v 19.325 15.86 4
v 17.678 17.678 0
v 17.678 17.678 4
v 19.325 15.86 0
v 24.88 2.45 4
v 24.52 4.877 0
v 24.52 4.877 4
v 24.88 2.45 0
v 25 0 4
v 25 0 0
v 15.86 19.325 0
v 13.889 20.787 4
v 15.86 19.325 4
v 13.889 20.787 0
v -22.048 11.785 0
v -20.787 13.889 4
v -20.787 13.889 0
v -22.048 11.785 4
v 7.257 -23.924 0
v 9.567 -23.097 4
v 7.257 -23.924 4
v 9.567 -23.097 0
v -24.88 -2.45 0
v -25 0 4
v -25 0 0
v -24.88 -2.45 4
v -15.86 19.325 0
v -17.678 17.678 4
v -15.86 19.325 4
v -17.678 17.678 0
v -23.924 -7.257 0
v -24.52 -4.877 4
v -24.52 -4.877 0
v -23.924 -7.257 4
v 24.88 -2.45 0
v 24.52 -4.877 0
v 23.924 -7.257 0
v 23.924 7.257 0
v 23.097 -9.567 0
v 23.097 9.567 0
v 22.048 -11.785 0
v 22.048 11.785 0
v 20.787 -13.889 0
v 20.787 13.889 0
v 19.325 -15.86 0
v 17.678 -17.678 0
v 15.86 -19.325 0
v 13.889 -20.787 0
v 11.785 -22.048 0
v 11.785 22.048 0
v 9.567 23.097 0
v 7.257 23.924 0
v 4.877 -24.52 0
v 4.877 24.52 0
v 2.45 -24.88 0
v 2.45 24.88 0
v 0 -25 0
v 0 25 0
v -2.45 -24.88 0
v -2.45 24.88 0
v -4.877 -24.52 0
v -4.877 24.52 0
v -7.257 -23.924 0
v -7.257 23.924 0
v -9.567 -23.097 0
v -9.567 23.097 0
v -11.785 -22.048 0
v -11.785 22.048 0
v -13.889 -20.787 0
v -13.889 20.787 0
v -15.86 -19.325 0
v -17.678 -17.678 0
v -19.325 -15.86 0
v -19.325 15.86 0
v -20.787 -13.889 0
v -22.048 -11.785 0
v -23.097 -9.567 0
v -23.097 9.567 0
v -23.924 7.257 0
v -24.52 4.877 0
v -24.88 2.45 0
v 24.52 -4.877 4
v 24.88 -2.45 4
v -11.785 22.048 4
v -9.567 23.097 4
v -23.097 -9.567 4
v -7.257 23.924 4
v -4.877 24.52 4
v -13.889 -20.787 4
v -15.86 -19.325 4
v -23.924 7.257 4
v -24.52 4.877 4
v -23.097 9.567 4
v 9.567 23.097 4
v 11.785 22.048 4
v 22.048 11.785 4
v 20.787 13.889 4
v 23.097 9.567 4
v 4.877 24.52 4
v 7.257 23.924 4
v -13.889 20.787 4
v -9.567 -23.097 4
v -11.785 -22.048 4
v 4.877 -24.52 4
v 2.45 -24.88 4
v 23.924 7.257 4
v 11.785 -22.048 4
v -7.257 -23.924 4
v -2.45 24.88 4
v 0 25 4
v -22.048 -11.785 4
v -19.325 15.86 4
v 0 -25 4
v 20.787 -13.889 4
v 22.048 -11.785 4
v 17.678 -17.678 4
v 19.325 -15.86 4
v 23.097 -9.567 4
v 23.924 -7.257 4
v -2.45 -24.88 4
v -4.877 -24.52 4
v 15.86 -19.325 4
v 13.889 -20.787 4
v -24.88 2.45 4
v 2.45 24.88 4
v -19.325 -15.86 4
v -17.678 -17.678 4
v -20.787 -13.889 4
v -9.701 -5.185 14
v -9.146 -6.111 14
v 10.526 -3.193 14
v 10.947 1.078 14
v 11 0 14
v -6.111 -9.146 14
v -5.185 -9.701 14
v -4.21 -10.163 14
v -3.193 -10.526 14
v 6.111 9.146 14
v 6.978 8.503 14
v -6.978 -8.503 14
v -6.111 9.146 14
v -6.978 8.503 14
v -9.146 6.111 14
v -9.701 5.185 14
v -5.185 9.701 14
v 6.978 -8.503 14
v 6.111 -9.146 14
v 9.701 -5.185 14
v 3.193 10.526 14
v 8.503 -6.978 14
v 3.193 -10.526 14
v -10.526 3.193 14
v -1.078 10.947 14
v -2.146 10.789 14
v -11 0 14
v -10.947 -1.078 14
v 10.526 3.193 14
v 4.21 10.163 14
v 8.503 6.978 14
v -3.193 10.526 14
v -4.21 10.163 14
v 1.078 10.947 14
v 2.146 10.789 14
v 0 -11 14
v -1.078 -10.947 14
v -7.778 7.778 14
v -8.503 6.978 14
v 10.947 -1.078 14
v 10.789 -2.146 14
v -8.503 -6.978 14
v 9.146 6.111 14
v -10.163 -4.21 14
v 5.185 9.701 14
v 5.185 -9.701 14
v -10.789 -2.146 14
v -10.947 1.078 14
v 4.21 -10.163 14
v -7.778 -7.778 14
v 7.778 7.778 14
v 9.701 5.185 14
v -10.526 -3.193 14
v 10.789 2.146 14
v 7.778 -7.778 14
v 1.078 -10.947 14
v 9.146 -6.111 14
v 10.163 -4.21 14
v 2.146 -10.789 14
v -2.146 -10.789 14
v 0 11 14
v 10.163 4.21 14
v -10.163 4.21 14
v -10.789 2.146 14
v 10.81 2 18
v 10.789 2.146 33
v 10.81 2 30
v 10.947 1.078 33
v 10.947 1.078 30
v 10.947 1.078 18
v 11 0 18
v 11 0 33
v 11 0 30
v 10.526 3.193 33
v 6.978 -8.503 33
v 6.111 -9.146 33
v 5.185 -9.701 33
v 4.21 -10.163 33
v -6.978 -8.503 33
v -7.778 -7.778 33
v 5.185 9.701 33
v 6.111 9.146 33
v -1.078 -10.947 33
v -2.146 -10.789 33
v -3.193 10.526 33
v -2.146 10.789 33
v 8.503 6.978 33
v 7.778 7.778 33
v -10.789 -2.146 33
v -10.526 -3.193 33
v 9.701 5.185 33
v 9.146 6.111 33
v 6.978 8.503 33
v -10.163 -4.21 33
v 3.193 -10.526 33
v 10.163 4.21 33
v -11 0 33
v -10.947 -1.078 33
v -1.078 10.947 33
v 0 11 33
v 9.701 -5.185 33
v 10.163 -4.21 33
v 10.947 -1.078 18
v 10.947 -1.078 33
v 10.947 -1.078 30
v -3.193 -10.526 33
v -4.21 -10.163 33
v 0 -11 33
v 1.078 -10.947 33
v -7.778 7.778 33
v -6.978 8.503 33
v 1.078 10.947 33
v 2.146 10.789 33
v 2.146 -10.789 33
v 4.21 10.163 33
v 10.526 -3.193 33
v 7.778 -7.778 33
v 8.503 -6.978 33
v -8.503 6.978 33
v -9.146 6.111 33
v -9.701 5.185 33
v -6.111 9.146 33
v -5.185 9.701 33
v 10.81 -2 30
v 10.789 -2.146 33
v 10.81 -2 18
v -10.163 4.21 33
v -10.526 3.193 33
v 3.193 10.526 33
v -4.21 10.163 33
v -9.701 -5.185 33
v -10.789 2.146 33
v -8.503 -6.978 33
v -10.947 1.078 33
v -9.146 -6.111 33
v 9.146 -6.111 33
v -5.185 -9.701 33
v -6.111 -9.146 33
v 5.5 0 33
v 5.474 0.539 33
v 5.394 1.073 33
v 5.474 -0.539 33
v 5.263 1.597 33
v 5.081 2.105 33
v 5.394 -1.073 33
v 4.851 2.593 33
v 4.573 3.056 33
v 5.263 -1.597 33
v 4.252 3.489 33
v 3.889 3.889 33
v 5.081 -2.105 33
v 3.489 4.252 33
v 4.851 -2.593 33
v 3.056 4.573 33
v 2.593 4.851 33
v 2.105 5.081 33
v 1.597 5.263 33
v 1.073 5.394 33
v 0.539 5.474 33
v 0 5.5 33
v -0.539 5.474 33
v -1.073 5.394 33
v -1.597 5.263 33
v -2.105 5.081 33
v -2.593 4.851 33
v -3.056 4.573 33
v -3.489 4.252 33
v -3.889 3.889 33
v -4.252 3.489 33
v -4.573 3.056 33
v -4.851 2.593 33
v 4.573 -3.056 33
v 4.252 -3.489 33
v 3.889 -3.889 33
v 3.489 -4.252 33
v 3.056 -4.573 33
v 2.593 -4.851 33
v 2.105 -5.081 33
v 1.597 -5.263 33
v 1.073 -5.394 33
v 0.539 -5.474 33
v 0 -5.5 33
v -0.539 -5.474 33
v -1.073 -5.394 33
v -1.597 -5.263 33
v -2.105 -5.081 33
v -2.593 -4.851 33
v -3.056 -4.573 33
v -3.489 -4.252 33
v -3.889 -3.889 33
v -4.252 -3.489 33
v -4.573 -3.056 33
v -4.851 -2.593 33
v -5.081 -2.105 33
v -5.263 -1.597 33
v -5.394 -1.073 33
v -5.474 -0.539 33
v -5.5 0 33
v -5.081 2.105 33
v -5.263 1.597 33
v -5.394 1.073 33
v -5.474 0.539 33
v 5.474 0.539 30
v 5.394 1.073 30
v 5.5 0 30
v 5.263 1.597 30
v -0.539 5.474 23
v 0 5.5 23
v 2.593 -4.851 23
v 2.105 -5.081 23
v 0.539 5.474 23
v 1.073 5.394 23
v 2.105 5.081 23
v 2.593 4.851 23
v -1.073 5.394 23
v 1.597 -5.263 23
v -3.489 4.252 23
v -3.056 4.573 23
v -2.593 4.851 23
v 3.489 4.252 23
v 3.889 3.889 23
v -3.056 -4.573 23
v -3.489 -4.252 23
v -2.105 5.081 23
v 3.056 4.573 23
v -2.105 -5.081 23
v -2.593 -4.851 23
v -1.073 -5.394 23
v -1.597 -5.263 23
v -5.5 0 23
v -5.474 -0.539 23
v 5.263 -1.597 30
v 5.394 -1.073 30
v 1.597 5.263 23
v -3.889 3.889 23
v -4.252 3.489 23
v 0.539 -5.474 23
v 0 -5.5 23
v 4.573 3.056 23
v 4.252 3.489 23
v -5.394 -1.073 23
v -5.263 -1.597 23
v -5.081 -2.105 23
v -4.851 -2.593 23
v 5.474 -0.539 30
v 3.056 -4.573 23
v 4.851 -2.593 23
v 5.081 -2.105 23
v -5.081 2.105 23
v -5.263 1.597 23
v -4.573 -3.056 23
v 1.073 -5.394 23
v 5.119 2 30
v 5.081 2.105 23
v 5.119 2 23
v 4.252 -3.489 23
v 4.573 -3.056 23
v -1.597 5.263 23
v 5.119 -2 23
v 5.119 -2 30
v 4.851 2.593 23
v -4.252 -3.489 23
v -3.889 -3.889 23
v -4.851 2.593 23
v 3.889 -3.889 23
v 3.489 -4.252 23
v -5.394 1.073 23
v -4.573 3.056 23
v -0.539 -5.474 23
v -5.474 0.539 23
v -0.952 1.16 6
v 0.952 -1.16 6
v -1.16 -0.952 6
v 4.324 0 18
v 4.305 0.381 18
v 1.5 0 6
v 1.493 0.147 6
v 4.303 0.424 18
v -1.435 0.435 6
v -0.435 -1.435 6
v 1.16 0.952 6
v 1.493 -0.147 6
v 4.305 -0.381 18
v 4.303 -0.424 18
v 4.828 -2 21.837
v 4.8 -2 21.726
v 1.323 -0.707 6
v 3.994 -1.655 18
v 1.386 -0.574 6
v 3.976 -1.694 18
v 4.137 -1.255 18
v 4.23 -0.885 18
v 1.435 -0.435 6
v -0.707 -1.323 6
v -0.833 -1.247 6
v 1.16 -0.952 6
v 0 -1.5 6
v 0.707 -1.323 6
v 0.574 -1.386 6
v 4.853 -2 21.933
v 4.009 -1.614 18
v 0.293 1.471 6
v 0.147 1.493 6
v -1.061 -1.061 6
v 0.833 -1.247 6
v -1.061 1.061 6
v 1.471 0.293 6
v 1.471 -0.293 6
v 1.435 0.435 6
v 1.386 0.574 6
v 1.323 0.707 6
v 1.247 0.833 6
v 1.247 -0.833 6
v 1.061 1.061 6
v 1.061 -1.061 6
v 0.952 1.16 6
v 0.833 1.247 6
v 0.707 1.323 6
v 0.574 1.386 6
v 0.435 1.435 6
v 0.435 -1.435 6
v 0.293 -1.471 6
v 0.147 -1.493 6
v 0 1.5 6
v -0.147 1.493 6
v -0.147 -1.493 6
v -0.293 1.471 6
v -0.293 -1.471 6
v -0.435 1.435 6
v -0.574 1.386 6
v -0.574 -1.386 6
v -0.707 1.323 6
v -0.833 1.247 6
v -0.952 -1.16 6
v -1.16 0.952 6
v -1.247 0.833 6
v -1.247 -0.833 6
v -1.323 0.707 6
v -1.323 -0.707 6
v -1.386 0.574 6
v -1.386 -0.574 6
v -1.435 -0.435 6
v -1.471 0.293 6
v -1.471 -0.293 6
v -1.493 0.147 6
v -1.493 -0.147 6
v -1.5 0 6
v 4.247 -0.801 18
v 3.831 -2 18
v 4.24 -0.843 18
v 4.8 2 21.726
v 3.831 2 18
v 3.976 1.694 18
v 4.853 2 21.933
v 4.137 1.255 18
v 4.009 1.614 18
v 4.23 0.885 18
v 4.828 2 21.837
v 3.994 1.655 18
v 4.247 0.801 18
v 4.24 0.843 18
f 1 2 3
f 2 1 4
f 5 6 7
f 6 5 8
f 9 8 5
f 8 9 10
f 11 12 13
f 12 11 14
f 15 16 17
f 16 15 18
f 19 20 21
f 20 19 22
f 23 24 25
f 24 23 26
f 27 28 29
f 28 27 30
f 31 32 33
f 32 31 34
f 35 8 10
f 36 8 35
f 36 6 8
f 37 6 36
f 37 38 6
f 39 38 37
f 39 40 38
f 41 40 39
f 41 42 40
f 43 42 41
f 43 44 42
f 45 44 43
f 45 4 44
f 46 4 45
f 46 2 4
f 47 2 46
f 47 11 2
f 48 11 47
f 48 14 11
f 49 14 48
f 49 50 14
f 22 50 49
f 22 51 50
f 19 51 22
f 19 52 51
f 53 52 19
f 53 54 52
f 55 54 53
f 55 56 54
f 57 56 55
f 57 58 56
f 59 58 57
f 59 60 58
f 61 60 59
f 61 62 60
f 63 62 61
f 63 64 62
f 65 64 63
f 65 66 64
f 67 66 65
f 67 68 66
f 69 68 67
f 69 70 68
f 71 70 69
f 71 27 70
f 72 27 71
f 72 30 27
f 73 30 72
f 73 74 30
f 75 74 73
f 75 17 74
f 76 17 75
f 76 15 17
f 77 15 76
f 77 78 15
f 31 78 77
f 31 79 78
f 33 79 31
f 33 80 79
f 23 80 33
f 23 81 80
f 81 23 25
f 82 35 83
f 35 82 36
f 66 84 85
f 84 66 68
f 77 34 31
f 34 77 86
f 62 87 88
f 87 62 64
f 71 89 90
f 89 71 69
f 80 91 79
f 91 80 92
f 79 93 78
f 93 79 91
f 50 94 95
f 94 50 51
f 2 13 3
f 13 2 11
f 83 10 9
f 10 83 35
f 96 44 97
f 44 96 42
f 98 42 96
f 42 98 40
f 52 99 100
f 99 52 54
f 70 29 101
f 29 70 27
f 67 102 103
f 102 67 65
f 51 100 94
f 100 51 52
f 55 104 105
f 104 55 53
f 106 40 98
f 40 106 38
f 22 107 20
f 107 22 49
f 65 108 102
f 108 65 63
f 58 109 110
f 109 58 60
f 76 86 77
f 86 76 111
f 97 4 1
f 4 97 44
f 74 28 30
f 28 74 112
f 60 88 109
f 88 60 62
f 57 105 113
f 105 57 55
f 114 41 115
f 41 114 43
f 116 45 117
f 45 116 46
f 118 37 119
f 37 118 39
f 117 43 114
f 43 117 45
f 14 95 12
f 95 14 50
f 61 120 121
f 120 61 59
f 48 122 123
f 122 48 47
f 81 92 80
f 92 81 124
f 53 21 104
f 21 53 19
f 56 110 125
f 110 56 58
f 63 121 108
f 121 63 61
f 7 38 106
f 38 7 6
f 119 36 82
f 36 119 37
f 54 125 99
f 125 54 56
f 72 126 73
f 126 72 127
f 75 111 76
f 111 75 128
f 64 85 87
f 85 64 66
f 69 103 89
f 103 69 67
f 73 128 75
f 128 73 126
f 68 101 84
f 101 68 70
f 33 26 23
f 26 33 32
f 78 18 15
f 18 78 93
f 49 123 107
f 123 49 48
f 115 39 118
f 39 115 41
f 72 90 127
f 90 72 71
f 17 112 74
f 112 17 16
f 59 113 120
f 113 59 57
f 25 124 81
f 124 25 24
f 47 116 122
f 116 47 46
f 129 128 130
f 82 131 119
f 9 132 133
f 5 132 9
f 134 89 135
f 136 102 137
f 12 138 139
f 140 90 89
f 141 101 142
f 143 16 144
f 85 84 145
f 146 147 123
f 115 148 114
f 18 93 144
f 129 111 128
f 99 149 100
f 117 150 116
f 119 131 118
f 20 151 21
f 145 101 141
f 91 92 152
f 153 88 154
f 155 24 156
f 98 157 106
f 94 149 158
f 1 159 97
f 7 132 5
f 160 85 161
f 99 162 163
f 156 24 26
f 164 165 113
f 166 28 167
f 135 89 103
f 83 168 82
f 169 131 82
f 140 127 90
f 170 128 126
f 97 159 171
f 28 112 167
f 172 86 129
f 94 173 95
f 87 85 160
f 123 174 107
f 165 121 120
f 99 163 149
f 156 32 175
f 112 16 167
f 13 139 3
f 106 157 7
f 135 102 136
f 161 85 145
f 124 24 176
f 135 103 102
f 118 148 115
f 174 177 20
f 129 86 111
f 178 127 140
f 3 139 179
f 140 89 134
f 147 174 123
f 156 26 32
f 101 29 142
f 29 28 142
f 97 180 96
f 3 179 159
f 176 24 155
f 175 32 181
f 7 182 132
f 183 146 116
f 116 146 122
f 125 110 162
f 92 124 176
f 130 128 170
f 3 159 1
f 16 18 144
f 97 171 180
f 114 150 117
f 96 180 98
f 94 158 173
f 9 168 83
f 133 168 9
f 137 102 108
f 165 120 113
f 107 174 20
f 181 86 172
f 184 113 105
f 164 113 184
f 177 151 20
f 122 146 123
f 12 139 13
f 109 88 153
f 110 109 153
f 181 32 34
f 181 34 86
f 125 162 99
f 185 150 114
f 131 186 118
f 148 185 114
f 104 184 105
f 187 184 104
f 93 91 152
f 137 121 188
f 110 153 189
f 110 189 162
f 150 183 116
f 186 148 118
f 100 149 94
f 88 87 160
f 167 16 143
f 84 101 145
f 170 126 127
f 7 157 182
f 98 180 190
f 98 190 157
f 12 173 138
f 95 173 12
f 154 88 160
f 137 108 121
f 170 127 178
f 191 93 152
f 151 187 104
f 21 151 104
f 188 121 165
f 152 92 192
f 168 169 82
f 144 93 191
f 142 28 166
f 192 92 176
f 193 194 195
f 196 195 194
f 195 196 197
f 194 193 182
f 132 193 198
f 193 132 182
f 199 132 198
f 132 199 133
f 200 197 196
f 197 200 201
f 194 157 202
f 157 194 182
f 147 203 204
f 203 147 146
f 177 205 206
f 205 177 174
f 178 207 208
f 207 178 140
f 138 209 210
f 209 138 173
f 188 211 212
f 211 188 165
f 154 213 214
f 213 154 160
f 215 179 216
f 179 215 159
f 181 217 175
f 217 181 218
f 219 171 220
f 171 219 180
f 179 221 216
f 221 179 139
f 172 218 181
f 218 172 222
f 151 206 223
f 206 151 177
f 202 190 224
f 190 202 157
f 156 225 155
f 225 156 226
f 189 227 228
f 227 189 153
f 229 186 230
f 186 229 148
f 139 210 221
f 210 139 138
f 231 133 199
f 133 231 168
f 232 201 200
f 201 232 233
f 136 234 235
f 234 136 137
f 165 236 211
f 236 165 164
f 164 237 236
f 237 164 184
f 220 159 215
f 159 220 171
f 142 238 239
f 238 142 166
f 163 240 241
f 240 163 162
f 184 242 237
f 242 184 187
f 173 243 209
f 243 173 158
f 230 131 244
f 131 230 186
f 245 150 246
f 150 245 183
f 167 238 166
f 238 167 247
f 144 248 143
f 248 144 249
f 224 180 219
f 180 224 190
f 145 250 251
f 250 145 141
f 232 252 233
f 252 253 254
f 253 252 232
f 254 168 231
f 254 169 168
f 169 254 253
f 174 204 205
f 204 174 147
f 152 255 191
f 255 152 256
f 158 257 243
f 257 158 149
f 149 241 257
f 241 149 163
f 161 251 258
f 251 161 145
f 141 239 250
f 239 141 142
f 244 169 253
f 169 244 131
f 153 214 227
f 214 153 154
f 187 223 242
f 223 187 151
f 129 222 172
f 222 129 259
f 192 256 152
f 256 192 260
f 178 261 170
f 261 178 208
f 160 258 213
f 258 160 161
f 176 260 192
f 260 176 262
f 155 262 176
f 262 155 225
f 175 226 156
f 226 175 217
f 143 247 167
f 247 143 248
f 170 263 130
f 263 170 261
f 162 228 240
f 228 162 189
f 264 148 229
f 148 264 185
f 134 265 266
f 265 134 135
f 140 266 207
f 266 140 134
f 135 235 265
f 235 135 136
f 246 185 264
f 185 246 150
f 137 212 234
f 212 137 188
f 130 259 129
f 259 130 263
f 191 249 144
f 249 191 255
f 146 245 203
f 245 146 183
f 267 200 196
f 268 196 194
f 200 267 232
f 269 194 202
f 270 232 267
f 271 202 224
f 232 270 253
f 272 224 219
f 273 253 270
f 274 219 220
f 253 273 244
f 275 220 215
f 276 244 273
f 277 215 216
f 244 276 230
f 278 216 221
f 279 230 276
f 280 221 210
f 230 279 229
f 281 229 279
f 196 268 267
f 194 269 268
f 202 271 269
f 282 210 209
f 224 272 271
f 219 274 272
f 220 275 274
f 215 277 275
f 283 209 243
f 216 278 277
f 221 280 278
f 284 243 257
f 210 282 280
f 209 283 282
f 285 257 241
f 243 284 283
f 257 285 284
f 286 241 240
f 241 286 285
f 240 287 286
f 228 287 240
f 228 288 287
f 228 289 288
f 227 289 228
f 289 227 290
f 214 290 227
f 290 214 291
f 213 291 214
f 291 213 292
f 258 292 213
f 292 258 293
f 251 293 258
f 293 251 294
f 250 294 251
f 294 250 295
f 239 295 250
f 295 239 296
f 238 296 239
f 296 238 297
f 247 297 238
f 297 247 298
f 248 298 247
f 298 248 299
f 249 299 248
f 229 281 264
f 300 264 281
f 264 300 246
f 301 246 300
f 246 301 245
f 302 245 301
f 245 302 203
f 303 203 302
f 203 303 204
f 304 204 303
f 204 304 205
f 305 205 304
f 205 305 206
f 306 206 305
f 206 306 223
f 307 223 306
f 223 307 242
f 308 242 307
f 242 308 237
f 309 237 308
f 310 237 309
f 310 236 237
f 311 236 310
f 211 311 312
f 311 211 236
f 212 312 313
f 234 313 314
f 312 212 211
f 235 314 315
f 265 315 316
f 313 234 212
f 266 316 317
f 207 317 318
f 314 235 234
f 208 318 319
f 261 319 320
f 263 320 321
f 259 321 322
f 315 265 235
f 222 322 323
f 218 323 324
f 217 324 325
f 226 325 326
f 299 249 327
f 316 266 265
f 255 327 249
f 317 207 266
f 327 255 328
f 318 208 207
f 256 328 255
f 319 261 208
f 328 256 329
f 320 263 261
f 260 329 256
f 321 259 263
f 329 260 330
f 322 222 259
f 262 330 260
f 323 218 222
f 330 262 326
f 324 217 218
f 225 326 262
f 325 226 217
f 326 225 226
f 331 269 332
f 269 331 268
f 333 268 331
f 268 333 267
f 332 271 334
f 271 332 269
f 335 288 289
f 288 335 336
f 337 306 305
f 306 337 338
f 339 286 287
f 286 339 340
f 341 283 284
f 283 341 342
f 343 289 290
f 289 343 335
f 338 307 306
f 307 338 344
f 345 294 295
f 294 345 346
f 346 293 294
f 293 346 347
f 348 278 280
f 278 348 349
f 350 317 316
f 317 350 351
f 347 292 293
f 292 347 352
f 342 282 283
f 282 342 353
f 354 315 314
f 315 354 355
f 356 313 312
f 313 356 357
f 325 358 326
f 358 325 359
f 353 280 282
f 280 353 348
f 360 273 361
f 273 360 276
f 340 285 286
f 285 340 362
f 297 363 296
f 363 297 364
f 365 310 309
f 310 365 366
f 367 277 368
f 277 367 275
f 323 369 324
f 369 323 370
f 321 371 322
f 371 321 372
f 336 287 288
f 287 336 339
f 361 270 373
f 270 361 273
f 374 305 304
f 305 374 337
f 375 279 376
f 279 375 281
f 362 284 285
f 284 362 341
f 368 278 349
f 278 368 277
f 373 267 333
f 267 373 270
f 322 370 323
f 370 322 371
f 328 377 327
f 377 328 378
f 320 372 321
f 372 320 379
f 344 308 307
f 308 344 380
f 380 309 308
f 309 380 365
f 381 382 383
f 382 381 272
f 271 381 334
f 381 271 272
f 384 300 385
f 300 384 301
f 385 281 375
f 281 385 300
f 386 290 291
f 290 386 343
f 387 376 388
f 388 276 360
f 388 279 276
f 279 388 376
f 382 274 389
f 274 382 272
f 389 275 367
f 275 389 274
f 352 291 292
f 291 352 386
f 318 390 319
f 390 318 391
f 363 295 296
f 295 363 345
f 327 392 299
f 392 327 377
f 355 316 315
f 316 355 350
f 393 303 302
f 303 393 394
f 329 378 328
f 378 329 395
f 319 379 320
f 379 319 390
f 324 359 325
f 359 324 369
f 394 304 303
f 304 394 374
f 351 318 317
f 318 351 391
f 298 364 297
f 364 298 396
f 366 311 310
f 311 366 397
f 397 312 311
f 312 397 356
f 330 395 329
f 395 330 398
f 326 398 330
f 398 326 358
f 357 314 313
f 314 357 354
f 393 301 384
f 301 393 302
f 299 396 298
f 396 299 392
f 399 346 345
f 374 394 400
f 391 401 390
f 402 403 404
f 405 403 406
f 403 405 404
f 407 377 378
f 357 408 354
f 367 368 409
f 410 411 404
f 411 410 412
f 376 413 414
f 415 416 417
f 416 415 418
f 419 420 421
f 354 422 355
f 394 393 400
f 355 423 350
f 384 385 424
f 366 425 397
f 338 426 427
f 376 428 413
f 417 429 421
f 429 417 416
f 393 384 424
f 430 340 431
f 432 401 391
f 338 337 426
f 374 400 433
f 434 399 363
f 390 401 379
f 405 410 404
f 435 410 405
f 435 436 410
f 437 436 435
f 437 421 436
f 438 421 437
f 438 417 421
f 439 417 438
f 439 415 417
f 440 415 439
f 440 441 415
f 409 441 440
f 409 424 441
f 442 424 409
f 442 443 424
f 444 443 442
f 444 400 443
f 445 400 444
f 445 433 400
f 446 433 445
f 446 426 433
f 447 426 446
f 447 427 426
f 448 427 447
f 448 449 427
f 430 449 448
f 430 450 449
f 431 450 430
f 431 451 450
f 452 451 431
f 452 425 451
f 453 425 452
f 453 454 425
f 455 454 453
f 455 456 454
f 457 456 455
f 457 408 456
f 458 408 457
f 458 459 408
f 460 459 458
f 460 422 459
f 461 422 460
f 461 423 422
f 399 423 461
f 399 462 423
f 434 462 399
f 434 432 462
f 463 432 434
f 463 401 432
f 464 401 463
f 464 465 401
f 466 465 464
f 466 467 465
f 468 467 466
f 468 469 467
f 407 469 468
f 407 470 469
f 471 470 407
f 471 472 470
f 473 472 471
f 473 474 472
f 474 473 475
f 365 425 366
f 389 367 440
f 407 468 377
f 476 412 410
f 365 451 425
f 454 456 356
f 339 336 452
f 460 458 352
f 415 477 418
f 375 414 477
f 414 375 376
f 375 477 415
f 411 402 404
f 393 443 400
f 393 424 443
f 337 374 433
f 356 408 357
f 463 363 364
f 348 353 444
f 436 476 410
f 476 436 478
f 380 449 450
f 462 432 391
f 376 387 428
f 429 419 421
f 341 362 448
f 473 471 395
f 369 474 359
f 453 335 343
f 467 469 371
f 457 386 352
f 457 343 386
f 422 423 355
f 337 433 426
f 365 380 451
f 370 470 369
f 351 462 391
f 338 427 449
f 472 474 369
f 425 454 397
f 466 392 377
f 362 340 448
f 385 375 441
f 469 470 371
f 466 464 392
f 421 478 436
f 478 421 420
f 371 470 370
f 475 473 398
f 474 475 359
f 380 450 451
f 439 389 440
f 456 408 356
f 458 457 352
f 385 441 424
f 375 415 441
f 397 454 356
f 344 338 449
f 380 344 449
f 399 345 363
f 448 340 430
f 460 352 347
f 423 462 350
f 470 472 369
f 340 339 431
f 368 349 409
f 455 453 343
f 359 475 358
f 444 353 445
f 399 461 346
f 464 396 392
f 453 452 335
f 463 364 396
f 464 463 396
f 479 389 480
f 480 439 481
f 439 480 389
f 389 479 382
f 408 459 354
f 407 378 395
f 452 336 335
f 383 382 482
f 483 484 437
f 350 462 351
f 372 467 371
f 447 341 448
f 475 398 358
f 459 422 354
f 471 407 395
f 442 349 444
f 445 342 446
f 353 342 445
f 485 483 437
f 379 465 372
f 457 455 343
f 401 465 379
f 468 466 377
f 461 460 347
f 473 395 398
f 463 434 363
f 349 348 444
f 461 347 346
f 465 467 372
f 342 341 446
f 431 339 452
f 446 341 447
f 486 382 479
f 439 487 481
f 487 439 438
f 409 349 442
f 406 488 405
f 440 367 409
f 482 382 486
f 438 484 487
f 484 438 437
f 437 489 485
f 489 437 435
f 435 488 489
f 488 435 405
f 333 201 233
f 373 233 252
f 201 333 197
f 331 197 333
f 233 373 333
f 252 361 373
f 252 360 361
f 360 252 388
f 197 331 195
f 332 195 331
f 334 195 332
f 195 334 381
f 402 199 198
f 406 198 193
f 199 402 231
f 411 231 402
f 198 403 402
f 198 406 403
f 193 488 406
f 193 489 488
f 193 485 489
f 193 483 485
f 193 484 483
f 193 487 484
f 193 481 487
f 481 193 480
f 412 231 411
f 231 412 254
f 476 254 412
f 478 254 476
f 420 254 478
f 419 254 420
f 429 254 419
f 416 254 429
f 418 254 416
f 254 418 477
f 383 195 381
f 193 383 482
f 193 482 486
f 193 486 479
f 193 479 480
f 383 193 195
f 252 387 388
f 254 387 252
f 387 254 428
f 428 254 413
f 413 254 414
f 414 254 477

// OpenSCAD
// Stand for a 1.5 mL microcentrifuge tube, printed standing up.
// All dimensions in millimetres, measured with calipers.

$fn = 64;

// Base disc
base_d = 50;      // base disc diameter
base_h = 4;       // base disc height (z = 0 to 4)

// Cone (base to column)
cone_top_d = 22;  // cone top diameter (at z = 14)
cone_z0 = 4;      // cone starts at z = 4
cone_z1 = 14;     // cone ends at z = 14

// Column
col_d = 22;       // column diameter
col_z0 = 14;      // column starts at z = 14
col_z1 = 33;      // column ends at z = 33 (top)

// Tube seat (bore from the top)
seat_d = 11;      // seat diameter (z = 33 down to 23)
seat_z0 = 23;     // seat bottom (z = 23)
seat_z1 = 33;     // seat top (z = 33, open at top)

// Tip cone (follows the tube's conical tip)
tip_top_d = 11;   // tip cone top diameter (at z = 23)
tip_bot_d = 3;    // tip cone bottom diameter (at z = 6)
tip_z0 = 6;       // tip cone bottom (z = 6)
tip_z1 = 23;      // tip cone top (z = 23)

// Viewing window (cut through the +X column wall)
win_w = 4;       // window width in Y
win_z0 = 18;     // window bottom (z = 18)
win_z1 = 30;     // window top (z = 30)

// ------------------------------------------------------------------
// Build the solid stand (base + cone + column), then subtract the
// tube seat and the viewing window.
// ------------------------------------------------------------------

// Base disc: 50 mm diameter, z = 0 to 4
module base() { translate([0, 0, 0])
    cylinder(h = base_h, d = base_d, $fn = $fn); }

// Cone: 50 mm at z = 4 narrowing to 22 mm at z = 14
module cone() { translate([0, 0, cone_z0])
    cylinder(h = cone_z1 - cone_z0, d1 = base_d, d2 = cone_top_d, $fn = $fn); }

// Column: 22 mm diameter, z = 14 to 33
module column() { translate([0, 0, col_z0])
    cylinder(h = col_z1 - col_z0, d = col_d, $fn = $fn); }

// Tube seat: 11 mm bore from z = 33 down to z = 23
module seat() { translate([0, 0, seat_z0])
    cylinder(h = seat_z1 - seat_z0, d = seat_d, $fn = $fn); }

// Tip cone: 11 mm at z = 23 narrowing to 3 mm at z = 6
module tip() { translate([0, 0, tip_z0])
    cylinder(h = tip_z1 - tip_z0, d1 = tip_bot_d, d2 = tip_top_d, $fn = $fn); }

// Viewing window: 4 mm wide in Y, cut through the +X wall only.
// The box starts at x = 0 (inside the seat bore on the +X side)
// and extends past the +X outer face (x = 11) to ensure a clean cut.
// It is centred in Y and spans the full Z range of the window.
module window() { translate([0, -win_w/2, win_z0])
    cube([11.01, win_w, win_z1 - win_z0]); }

// Final part
difference() {
    union() {
        base();
        cone();
        column();
    }
    union() {
        seat();
        tip();
    }
    window();
}
